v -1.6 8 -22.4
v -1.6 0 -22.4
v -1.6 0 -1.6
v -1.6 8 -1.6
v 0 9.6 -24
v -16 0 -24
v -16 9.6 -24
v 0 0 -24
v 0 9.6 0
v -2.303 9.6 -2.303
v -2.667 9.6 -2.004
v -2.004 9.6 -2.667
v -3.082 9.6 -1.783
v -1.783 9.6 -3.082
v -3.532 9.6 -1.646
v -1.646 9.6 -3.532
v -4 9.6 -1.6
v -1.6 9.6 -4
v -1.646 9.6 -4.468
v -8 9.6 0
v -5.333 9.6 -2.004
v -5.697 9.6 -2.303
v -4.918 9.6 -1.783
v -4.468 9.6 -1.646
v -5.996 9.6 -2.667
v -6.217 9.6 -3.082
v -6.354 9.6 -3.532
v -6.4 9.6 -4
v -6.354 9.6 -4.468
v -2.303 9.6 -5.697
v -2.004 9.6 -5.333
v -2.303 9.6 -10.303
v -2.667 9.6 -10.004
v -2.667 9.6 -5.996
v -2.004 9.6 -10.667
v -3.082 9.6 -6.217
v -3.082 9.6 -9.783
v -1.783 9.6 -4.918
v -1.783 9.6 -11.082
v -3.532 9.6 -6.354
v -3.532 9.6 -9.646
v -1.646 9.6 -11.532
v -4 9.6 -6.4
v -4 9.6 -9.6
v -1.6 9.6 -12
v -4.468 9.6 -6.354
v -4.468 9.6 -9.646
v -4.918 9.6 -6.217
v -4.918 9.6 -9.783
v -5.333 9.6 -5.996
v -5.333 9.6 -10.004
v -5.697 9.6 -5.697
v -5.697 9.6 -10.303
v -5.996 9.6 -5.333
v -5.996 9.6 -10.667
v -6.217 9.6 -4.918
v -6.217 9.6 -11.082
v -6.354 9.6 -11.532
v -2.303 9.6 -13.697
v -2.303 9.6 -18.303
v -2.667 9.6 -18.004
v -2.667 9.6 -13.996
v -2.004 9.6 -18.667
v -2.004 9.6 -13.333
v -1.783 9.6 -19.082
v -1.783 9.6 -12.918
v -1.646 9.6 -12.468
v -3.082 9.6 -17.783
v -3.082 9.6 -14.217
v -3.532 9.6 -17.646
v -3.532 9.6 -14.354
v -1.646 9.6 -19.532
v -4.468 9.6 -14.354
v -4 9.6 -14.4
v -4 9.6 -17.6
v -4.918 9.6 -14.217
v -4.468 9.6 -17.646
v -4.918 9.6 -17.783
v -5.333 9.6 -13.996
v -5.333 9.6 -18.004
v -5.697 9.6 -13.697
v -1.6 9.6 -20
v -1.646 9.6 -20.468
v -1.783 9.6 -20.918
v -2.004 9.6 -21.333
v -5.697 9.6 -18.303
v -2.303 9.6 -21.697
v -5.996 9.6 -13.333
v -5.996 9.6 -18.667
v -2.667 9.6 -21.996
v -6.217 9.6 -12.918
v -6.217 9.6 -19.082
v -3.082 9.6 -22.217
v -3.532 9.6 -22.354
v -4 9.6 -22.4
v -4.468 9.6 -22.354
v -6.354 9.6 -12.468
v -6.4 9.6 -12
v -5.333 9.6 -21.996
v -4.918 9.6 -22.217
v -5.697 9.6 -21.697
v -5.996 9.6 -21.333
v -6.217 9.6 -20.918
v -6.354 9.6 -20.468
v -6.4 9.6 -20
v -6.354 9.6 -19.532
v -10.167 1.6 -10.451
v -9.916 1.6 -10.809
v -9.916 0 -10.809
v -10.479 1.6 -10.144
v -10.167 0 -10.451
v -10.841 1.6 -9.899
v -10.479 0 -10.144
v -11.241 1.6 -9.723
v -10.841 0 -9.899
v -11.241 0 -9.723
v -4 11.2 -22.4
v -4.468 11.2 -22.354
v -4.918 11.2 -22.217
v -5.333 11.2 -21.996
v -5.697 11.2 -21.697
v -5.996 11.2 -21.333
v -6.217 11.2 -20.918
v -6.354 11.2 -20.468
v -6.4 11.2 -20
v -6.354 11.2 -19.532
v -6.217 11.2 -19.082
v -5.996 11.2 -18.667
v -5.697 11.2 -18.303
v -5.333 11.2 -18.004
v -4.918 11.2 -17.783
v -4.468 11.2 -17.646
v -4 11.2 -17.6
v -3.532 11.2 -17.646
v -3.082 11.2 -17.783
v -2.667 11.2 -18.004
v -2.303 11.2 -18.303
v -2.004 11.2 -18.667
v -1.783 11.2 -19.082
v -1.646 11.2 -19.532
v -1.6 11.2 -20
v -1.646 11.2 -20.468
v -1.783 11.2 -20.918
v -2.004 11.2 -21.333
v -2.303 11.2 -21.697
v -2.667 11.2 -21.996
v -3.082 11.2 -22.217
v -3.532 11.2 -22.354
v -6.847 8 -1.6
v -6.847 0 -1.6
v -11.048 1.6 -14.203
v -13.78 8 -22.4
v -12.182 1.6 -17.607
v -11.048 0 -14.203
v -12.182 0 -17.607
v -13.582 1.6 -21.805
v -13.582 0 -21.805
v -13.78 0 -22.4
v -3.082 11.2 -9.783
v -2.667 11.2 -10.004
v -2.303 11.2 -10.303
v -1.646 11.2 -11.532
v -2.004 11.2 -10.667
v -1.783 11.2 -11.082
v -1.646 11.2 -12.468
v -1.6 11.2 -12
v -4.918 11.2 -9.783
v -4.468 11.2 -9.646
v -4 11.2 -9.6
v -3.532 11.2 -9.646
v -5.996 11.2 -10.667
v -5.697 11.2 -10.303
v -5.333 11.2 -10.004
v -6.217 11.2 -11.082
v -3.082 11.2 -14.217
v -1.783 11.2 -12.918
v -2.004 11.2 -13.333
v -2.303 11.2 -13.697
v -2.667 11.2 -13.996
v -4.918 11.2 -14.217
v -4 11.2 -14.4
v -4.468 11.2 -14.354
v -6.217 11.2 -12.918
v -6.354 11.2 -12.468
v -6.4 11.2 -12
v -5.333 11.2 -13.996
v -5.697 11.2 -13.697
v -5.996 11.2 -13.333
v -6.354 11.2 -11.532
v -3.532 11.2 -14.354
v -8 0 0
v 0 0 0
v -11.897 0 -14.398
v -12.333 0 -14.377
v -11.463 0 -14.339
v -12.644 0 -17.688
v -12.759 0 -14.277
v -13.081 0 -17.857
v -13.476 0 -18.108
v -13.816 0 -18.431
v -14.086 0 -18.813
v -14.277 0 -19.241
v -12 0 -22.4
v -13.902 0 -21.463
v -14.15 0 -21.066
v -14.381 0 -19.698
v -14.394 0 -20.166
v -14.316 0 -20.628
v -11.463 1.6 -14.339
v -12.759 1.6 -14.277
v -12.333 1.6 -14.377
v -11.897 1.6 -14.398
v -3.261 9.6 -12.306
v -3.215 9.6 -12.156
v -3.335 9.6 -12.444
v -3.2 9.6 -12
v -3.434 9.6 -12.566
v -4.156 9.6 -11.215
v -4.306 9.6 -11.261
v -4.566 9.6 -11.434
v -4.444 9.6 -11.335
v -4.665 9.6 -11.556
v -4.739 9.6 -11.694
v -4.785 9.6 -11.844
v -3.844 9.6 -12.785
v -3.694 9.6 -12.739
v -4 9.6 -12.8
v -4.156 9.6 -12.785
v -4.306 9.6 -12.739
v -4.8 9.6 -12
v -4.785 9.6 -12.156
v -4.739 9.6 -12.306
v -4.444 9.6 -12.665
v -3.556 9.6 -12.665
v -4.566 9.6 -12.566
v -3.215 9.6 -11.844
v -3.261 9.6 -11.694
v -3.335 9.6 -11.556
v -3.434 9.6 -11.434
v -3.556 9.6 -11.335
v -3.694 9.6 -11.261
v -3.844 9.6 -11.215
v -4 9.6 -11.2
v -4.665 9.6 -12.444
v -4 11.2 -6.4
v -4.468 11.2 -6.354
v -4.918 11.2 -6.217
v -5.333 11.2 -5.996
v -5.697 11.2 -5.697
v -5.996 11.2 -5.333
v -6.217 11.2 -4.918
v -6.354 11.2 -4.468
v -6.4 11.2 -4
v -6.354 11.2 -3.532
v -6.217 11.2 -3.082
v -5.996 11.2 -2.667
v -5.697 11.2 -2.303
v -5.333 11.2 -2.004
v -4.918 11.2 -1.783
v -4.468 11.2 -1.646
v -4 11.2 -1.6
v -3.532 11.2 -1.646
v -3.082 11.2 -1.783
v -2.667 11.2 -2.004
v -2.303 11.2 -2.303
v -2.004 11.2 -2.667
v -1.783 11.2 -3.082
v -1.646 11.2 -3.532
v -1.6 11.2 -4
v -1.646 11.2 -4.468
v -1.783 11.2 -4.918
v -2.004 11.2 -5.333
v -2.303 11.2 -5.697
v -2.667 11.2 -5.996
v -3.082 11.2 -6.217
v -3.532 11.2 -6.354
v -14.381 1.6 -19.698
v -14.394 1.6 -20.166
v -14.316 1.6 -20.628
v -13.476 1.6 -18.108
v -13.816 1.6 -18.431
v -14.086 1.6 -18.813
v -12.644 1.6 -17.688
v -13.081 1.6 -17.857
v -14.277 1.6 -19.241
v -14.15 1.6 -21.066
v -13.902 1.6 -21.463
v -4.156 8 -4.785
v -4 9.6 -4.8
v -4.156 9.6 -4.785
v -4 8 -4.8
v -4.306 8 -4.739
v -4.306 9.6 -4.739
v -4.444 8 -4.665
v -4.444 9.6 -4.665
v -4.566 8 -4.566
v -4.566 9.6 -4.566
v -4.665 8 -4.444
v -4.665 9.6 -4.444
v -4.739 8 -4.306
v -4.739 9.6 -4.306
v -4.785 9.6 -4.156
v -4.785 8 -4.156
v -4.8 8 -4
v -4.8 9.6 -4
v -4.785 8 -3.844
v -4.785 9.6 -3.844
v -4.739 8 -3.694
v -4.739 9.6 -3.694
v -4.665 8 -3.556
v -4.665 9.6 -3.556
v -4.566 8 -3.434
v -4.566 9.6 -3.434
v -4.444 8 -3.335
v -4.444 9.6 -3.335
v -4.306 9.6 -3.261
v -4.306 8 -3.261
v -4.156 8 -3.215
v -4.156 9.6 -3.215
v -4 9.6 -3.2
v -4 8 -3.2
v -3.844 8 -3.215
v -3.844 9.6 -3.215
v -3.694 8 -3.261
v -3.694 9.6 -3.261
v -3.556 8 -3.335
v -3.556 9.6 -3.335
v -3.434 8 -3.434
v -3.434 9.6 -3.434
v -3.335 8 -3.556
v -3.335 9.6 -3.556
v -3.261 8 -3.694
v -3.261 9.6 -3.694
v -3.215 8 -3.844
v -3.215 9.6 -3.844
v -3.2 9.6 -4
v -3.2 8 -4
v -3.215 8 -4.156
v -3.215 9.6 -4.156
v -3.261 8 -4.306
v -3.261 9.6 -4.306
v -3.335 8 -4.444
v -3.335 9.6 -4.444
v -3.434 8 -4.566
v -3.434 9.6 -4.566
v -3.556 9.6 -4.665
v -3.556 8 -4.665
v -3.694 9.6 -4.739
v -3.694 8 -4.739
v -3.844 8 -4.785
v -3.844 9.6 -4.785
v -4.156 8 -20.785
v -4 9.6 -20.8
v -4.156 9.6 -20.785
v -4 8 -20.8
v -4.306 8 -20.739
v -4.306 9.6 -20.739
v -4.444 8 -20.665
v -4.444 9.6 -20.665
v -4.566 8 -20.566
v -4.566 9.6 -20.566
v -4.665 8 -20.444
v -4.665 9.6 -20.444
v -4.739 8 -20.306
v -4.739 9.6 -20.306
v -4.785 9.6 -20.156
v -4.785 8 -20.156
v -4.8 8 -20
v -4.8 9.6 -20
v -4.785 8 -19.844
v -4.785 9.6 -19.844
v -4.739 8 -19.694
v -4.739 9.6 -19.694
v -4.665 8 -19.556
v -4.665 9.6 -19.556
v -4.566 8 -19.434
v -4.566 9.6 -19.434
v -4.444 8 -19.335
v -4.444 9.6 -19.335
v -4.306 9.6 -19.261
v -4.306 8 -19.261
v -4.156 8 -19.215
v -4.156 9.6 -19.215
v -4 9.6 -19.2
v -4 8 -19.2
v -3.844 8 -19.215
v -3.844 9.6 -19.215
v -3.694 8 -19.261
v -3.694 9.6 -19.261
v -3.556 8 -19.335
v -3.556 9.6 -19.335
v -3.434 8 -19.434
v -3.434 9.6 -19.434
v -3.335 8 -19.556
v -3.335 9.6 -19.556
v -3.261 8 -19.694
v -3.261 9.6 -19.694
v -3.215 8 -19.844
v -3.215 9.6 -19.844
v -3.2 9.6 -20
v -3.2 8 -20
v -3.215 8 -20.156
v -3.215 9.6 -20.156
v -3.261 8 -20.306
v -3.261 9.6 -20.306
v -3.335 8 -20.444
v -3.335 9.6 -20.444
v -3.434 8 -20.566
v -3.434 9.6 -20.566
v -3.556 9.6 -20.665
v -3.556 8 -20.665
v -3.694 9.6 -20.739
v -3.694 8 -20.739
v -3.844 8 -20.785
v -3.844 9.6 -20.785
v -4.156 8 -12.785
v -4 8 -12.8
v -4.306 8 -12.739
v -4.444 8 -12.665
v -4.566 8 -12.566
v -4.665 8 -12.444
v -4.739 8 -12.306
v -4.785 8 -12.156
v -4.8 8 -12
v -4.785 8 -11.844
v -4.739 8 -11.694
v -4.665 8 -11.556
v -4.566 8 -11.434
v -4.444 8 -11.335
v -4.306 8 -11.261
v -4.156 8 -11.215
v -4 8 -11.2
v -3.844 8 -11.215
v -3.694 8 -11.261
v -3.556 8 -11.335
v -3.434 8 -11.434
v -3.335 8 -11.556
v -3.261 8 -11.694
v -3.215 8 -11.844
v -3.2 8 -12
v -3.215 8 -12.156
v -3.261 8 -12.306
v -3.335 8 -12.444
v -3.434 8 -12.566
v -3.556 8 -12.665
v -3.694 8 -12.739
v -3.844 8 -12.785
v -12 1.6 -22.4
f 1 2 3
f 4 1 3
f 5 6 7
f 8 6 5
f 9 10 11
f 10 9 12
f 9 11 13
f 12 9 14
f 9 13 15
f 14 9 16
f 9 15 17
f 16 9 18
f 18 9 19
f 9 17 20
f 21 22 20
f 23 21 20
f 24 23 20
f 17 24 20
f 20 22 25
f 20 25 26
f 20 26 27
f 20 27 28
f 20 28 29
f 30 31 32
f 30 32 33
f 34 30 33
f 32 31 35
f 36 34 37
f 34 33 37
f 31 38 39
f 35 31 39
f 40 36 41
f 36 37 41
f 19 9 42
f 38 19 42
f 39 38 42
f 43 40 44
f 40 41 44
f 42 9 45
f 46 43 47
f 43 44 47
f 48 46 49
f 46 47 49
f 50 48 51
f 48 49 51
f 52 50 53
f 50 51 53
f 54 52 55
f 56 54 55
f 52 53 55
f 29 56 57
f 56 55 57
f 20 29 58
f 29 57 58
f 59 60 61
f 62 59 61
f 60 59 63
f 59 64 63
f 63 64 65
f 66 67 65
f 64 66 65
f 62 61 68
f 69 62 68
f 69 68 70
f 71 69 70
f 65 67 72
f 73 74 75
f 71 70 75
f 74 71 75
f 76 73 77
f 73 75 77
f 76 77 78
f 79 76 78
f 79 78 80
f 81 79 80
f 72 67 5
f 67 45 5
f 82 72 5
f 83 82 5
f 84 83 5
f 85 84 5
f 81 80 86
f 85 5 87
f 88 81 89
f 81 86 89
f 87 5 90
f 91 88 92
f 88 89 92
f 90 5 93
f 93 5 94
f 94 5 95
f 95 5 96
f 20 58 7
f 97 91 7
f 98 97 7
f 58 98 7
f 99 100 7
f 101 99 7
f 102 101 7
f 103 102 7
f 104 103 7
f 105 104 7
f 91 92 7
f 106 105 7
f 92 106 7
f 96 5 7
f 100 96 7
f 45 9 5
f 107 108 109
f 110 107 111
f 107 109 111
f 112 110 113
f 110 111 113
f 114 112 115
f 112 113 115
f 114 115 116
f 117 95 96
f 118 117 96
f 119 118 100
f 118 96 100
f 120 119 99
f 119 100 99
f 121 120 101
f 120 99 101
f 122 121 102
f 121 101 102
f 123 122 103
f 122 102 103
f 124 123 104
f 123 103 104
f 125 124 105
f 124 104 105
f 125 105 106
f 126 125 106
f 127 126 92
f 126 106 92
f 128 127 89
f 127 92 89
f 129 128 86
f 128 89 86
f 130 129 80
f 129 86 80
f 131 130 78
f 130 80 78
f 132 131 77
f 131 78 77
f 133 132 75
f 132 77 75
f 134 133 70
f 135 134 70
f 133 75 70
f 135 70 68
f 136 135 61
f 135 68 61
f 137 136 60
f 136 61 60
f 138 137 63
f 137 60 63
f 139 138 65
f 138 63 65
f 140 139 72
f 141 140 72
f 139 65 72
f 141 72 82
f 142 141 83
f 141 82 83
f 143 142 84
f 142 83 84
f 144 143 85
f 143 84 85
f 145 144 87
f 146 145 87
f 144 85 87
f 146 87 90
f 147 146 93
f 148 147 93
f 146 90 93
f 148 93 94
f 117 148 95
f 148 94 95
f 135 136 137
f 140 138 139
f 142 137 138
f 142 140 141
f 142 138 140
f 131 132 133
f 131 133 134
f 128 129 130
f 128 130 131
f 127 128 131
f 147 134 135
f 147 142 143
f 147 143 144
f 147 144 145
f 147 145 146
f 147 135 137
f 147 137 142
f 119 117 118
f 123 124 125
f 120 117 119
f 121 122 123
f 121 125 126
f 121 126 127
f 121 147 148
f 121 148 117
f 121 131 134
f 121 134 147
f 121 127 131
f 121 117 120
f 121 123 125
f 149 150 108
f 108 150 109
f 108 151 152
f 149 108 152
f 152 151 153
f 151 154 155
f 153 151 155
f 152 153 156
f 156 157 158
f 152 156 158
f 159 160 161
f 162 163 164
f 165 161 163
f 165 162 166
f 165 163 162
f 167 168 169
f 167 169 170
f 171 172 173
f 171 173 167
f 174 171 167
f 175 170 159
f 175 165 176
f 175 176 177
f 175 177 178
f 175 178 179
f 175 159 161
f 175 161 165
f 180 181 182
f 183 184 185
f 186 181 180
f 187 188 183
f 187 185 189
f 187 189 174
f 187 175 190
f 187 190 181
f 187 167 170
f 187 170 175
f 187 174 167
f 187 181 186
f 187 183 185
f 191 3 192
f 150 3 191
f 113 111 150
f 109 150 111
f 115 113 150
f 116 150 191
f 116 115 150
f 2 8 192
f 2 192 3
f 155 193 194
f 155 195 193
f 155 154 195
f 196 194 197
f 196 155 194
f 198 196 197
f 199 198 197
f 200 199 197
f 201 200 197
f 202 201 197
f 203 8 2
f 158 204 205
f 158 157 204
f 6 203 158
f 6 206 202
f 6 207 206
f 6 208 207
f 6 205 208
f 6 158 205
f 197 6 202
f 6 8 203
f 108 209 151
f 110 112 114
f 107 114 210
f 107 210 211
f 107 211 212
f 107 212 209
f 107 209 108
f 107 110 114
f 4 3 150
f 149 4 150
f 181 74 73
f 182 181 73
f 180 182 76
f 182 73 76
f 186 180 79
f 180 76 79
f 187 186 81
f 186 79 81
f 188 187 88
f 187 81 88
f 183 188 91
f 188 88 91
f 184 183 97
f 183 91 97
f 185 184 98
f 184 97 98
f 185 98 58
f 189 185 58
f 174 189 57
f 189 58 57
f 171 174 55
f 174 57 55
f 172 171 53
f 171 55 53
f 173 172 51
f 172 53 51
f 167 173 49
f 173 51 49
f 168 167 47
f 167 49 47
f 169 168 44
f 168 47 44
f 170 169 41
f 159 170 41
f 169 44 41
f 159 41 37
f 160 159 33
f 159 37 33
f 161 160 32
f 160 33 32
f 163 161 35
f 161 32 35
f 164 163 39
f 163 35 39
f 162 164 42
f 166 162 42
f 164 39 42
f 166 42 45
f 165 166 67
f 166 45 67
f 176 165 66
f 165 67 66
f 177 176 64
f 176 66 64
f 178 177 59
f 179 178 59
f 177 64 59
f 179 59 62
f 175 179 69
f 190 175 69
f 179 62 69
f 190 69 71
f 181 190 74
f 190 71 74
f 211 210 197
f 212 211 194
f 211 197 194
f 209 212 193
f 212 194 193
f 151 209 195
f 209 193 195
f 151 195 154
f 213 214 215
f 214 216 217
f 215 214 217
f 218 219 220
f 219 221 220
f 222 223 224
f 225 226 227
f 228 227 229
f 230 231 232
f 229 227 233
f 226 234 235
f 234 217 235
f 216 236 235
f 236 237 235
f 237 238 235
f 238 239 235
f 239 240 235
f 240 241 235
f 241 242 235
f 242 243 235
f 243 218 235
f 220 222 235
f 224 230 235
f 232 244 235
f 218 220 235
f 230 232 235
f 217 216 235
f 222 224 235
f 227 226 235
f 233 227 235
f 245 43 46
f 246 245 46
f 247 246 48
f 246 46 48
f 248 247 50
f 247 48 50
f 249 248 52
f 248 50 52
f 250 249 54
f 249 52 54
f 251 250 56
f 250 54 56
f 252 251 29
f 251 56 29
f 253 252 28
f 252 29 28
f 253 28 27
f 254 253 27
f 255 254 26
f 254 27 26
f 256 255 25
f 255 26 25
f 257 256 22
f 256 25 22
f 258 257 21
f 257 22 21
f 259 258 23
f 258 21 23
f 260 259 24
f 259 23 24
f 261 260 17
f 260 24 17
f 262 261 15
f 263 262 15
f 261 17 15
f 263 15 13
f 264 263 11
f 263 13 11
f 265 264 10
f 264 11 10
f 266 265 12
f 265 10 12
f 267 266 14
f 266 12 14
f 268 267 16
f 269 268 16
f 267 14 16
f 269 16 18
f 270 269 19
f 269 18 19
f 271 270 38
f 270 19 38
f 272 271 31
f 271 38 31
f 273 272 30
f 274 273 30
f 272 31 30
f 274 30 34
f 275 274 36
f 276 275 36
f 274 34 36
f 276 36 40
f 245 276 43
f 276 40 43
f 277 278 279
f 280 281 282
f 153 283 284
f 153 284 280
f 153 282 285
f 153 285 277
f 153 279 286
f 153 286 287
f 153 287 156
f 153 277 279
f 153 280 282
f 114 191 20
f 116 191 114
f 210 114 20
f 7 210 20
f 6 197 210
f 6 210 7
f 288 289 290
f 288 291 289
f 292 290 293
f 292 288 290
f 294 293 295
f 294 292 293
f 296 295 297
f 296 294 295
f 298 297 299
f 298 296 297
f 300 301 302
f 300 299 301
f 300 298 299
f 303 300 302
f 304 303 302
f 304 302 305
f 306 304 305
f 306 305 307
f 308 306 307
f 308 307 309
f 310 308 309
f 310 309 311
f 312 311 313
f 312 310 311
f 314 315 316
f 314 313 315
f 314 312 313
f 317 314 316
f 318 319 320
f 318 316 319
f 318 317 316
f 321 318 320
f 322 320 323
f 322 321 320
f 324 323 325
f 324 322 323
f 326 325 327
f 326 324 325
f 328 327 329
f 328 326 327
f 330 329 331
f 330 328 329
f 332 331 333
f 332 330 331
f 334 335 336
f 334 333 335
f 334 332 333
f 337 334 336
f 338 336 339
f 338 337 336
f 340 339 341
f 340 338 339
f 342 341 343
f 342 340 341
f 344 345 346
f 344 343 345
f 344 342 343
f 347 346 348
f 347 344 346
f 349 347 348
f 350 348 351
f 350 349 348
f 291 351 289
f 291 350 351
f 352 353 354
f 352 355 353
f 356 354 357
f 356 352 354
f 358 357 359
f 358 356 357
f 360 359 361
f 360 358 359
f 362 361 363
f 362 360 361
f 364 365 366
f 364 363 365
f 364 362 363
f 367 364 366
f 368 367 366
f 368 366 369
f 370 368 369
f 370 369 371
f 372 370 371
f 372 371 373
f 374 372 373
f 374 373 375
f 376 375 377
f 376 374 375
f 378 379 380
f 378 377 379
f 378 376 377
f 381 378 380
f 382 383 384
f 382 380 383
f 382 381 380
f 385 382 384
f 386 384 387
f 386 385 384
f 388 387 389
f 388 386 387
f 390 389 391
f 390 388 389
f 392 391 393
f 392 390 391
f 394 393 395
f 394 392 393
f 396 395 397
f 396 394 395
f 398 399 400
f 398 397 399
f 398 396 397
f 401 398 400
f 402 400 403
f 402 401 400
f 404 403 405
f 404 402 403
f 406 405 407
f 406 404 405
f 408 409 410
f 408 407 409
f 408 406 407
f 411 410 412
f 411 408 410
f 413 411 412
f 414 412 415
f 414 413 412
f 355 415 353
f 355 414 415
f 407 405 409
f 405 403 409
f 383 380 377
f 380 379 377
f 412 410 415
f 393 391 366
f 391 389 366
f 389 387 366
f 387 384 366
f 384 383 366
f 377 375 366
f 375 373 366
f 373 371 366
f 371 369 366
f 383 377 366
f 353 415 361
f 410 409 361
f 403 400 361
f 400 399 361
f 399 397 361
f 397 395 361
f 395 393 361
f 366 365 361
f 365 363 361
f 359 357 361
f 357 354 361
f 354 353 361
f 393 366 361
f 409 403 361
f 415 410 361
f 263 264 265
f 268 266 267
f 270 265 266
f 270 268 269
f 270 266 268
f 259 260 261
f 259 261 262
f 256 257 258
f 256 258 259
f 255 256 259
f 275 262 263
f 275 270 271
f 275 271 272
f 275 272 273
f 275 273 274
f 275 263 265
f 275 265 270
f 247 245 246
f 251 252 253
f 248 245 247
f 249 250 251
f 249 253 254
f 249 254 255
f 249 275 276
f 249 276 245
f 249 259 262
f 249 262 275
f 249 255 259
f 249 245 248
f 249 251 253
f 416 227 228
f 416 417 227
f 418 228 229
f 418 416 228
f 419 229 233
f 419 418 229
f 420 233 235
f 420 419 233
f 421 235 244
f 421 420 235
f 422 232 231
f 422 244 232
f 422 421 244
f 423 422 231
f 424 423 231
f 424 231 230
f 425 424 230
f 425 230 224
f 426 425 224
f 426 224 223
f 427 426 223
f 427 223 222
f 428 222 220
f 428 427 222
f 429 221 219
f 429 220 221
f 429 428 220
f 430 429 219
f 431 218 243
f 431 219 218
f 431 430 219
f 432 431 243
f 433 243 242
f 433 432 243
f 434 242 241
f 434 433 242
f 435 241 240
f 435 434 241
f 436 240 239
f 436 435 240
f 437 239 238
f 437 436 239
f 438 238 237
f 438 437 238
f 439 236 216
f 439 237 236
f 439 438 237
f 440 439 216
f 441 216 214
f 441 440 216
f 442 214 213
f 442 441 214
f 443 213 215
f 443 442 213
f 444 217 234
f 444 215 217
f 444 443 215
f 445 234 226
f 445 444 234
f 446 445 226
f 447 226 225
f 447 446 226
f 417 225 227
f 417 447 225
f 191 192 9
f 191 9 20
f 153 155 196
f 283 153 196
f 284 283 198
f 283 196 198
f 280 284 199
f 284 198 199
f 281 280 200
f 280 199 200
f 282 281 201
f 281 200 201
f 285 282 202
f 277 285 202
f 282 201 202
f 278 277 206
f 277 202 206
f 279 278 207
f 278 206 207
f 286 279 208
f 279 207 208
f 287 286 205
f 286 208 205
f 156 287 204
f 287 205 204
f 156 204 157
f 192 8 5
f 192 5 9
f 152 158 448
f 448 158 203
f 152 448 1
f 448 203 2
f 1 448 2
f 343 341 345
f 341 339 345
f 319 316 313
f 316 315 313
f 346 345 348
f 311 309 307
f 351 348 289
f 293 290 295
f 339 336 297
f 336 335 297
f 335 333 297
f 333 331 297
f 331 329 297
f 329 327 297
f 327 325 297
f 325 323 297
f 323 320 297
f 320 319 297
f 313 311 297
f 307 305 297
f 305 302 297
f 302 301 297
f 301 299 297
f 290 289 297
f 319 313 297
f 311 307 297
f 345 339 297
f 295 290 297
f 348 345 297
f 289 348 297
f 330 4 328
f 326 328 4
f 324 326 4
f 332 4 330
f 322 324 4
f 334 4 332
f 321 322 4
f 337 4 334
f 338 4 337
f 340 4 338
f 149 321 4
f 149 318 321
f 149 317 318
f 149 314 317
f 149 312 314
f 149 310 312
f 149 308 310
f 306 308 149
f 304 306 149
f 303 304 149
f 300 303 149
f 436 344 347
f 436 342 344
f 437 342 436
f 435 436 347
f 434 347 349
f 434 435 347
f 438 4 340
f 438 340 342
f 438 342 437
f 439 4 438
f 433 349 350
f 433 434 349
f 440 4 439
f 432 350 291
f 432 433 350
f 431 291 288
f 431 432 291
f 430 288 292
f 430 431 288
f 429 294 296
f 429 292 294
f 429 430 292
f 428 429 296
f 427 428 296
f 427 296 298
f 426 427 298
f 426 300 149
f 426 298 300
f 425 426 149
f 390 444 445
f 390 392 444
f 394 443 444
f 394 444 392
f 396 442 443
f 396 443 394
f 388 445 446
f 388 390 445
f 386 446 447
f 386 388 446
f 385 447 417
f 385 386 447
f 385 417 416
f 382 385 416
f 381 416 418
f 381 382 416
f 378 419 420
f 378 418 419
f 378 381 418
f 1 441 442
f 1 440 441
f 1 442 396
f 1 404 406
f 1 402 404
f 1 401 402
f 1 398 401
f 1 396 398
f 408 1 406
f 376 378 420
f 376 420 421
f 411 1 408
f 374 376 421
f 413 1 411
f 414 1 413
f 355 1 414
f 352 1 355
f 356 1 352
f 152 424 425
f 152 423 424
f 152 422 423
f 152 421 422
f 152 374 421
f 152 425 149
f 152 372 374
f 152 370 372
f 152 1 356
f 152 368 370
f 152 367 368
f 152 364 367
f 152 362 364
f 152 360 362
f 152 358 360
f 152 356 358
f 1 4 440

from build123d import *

# Parameters (mm, degrees)
BOSS_EXTRUDE1_DEPTH = 9.6
SKETCH2_R           = 2.4
BOSS_EXTRUDE2_DEPTH = 1.6
LPATTERN1_COUNT     = 3
LPATTERN1_PITCH     = 8
SHELL1_T            = -1.6
SKETCH3_R           = 2.4
CUT_EXTRUDE1_DEPTH  = 1.6


with BuildPart() as part:
    # Sketch1 → Boss-Extrude1 (new body)
    with BuildSketch(Plane(origin=(0, 0, 0), x_dir=(1, 0, 0), z_dir=(0, 1, 0))):
        Polygon((0, 0), (-8, 0), (-16, 24), (0, 24), align=None)
    extrude(amount=BOSS_EXTRUDE1_DEPTH)

    # Sketch2 → Boss-Extrude2 (add)
    with BuildSketch(Plane(origin=(0, 9.6, 0), x_dir=(1, 0, 0), z_dir=(0, 1, 0))):
        with Locations(Location((-4, 4, 0), (0, 0, 90))):
            Circle(SKETCH2_R)
    boss_extrude2 = extrude(amount=BOSS_EXTRUDE2_DEPTH)

    # LPattern1: Boss-Extrude2 ×3
    with Locations(*[(0, 0, -i * LPATTERN1_PITCH) for i in range(1, LPATTERN1_COUNT)]):
        add(boss_extrude2)

    # Shell1
    shell1_openings = [part.faces().sort_by_distance(p)[0] for p in [
        (-6.222222222, 0, -13.333333333),
    ]]
    offset(amount=SHELL1_T, openings=shell1_openings, kind=Kind.INTERSECTION)

    # Sketch3 → Cut-Extrude1 (cut)
    with BuildSketch(Plane.XZ):
        with Locations((-12, -12)):
            Circle(SKETCH3_R)
        with Locations((-12, -20)):
            Circle(SKETCH3_R)
    extrude(amount=-CUT_EXTRUDE1_DEPTH, mode=Mode.SUBTRACT)


solid = part.part
